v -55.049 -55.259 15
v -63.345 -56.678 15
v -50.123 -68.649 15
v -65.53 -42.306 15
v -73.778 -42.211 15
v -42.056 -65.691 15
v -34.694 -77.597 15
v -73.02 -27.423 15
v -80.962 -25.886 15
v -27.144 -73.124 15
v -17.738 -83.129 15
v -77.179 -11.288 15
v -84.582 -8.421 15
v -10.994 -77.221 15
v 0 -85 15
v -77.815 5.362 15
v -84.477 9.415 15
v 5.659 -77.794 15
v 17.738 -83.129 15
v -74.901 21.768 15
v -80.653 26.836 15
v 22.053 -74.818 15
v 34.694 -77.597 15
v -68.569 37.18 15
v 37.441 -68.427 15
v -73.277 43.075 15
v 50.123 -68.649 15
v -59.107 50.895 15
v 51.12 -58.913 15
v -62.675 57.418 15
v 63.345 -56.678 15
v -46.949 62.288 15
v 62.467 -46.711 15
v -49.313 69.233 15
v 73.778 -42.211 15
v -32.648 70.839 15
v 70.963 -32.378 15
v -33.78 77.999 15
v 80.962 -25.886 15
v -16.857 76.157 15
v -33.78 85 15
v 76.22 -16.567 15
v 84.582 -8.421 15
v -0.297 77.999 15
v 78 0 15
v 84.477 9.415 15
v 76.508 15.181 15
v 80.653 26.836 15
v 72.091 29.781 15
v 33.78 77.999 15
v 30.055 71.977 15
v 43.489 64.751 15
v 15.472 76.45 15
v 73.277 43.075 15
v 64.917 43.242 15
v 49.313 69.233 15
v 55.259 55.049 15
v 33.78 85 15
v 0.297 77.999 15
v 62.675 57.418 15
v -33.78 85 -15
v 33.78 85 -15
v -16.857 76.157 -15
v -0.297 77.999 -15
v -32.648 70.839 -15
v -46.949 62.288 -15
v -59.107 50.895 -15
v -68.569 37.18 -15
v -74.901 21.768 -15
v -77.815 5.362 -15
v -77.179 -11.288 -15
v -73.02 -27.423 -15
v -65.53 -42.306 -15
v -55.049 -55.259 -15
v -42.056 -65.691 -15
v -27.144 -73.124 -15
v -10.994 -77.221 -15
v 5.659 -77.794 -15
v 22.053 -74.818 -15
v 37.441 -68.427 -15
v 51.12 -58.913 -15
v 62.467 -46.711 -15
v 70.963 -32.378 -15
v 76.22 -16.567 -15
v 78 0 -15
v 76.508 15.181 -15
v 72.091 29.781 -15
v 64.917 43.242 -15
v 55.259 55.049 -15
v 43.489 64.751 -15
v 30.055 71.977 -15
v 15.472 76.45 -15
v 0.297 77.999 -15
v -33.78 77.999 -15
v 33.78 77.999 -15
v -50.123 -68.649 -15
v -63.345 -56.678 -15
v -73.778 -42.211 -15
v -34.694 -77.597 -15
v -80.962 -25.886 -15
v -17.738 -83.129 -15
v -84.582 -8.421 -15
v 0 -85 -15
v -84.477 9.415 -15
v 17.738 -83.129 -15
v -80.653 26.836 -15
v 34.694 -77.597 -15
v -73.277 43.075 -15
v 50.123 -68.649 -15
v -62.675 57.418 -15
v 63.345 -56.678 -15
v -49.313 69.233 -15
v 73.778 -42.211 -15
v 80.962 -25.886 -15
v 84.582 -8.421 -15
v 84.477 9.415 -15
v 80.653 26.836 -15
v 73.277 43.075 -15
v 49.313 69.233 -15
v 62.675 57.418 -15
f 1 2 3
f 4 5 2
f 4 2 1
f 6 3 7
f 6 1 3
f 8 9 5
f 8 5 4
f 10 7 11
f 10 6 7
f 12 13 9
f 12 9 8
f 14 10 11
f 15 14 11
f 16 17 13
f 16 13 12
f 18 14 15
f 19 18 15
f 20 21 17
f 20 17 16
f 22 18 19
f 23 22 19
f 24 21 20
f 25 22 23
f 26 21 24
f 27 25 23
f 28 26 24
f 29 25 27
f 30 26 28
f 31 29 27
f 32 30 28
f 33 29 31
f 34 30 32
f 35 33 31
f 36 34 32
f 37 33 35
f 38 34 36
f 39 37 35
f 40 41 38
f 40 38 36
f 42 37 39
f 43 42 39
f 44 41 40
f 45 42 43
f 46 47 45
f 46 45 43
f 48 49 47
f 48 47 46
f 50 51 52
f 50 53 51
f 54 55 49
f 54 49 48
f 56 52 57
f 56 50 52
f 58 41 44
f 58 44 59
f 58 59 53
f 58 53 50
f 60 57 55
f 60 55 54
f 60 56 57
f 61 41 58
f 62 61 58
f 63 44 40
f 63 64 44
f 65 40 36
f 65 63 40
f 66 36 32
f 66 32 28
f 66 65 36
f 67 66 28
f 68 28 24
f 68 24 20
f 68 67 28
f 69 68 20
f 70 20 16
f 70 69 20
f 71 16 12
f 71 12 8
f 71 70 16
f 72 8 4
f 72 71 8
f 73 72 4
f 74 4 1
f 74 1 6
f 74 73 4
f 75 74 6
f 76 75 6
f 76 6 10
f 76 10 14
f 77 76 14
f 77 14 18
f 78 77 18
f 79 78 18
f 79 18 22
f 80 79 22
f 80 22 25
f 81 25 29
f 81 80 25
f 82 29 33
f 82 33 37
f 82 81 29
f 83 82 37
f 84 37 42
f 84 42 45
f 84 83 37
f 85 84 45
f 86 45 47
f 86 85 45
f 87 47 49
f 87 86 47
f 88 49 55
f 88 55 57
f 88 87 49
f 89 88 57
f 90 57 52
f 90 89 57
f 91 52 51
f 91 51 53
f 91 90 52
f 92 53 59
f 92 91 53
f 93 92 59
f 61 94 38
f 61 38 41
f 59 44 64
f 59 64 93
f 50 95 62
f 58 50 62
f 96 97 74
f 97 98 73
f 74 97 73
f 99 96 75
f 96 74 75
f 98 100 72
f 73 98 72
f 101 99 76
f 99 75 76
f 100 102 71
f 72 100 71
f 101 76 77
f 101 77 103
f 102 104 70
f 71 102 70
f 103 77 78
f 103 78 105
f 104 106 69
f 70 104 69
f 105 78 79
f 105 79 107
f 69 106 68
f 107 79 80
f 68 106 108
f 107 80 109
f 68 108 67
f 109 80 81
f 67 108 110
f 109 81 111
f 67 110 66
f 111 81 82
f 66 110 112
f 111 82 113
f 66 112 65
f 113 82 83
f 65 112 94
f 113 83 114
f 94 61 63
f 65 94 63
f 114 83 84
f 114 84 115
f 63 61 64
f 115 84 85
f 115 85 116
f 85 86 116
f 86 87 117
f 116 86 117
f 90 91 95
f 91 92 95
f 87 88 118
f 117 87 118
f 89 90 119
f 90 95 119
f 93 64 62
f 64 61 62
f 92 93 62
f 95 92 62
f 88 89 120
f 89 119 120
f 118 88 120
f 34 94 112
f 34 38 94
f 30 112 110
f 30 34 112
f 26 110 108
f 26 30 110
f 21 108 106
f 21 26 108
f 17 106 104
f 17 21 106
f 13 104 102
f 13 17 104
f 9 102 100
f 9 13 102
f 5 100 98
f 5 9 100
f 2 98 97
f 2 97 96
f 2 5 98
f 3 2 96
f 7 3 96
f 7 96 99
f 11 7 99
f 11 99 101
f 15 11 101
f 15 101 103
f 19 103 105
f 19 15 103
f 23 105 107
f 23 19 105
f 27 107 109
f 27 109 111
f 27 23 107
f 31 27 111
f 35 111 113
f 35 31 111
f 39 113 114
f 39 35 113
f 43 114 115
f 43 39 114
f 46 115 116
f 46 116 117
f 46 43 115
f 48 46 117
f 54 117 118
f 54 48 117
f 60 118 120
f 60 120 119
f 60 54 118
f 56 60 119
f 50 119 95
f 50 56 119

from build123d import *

# Parameters (mm, degrees)
IZIM1_R                     = 85
IZIM1_R_2                   = 78
Y_KSEKLIK_EKSTR_ZYON1_DEPTH = 15
IZIM2_W                     = 67.56
IZIM2_H                     = 7.000566669
Y_KSEKLIK_EKSTR_ZYON2_DEPTH = 30


with BuildPart() as part:
    # Çizim1 → Yükseklik-Ekstrüzyon1 (new, symmetric)
    with BuildSketch(Plane.XY):
        Circle(IZIM1_R)
        Circle(IZIM1_R_2, mode=Mode.SUBTRACT)
    extrude(amount=Y_KSEKLIK_EKSTR_ZYON1_DEPTH, both=True)

    # Çizim2 → Yükseklik-Ekstrüzyon2 (add)
    with BuildSketch(Plane.XY.offset(15)):
        with Locations((0, 81.499716666)):
            Rectangle(IZIM2_W, IZIM2_H)
    extrude(amount=-Y_KSEKLIK_EKSTR_ZYON2_DEPTH)


solid = part.part
